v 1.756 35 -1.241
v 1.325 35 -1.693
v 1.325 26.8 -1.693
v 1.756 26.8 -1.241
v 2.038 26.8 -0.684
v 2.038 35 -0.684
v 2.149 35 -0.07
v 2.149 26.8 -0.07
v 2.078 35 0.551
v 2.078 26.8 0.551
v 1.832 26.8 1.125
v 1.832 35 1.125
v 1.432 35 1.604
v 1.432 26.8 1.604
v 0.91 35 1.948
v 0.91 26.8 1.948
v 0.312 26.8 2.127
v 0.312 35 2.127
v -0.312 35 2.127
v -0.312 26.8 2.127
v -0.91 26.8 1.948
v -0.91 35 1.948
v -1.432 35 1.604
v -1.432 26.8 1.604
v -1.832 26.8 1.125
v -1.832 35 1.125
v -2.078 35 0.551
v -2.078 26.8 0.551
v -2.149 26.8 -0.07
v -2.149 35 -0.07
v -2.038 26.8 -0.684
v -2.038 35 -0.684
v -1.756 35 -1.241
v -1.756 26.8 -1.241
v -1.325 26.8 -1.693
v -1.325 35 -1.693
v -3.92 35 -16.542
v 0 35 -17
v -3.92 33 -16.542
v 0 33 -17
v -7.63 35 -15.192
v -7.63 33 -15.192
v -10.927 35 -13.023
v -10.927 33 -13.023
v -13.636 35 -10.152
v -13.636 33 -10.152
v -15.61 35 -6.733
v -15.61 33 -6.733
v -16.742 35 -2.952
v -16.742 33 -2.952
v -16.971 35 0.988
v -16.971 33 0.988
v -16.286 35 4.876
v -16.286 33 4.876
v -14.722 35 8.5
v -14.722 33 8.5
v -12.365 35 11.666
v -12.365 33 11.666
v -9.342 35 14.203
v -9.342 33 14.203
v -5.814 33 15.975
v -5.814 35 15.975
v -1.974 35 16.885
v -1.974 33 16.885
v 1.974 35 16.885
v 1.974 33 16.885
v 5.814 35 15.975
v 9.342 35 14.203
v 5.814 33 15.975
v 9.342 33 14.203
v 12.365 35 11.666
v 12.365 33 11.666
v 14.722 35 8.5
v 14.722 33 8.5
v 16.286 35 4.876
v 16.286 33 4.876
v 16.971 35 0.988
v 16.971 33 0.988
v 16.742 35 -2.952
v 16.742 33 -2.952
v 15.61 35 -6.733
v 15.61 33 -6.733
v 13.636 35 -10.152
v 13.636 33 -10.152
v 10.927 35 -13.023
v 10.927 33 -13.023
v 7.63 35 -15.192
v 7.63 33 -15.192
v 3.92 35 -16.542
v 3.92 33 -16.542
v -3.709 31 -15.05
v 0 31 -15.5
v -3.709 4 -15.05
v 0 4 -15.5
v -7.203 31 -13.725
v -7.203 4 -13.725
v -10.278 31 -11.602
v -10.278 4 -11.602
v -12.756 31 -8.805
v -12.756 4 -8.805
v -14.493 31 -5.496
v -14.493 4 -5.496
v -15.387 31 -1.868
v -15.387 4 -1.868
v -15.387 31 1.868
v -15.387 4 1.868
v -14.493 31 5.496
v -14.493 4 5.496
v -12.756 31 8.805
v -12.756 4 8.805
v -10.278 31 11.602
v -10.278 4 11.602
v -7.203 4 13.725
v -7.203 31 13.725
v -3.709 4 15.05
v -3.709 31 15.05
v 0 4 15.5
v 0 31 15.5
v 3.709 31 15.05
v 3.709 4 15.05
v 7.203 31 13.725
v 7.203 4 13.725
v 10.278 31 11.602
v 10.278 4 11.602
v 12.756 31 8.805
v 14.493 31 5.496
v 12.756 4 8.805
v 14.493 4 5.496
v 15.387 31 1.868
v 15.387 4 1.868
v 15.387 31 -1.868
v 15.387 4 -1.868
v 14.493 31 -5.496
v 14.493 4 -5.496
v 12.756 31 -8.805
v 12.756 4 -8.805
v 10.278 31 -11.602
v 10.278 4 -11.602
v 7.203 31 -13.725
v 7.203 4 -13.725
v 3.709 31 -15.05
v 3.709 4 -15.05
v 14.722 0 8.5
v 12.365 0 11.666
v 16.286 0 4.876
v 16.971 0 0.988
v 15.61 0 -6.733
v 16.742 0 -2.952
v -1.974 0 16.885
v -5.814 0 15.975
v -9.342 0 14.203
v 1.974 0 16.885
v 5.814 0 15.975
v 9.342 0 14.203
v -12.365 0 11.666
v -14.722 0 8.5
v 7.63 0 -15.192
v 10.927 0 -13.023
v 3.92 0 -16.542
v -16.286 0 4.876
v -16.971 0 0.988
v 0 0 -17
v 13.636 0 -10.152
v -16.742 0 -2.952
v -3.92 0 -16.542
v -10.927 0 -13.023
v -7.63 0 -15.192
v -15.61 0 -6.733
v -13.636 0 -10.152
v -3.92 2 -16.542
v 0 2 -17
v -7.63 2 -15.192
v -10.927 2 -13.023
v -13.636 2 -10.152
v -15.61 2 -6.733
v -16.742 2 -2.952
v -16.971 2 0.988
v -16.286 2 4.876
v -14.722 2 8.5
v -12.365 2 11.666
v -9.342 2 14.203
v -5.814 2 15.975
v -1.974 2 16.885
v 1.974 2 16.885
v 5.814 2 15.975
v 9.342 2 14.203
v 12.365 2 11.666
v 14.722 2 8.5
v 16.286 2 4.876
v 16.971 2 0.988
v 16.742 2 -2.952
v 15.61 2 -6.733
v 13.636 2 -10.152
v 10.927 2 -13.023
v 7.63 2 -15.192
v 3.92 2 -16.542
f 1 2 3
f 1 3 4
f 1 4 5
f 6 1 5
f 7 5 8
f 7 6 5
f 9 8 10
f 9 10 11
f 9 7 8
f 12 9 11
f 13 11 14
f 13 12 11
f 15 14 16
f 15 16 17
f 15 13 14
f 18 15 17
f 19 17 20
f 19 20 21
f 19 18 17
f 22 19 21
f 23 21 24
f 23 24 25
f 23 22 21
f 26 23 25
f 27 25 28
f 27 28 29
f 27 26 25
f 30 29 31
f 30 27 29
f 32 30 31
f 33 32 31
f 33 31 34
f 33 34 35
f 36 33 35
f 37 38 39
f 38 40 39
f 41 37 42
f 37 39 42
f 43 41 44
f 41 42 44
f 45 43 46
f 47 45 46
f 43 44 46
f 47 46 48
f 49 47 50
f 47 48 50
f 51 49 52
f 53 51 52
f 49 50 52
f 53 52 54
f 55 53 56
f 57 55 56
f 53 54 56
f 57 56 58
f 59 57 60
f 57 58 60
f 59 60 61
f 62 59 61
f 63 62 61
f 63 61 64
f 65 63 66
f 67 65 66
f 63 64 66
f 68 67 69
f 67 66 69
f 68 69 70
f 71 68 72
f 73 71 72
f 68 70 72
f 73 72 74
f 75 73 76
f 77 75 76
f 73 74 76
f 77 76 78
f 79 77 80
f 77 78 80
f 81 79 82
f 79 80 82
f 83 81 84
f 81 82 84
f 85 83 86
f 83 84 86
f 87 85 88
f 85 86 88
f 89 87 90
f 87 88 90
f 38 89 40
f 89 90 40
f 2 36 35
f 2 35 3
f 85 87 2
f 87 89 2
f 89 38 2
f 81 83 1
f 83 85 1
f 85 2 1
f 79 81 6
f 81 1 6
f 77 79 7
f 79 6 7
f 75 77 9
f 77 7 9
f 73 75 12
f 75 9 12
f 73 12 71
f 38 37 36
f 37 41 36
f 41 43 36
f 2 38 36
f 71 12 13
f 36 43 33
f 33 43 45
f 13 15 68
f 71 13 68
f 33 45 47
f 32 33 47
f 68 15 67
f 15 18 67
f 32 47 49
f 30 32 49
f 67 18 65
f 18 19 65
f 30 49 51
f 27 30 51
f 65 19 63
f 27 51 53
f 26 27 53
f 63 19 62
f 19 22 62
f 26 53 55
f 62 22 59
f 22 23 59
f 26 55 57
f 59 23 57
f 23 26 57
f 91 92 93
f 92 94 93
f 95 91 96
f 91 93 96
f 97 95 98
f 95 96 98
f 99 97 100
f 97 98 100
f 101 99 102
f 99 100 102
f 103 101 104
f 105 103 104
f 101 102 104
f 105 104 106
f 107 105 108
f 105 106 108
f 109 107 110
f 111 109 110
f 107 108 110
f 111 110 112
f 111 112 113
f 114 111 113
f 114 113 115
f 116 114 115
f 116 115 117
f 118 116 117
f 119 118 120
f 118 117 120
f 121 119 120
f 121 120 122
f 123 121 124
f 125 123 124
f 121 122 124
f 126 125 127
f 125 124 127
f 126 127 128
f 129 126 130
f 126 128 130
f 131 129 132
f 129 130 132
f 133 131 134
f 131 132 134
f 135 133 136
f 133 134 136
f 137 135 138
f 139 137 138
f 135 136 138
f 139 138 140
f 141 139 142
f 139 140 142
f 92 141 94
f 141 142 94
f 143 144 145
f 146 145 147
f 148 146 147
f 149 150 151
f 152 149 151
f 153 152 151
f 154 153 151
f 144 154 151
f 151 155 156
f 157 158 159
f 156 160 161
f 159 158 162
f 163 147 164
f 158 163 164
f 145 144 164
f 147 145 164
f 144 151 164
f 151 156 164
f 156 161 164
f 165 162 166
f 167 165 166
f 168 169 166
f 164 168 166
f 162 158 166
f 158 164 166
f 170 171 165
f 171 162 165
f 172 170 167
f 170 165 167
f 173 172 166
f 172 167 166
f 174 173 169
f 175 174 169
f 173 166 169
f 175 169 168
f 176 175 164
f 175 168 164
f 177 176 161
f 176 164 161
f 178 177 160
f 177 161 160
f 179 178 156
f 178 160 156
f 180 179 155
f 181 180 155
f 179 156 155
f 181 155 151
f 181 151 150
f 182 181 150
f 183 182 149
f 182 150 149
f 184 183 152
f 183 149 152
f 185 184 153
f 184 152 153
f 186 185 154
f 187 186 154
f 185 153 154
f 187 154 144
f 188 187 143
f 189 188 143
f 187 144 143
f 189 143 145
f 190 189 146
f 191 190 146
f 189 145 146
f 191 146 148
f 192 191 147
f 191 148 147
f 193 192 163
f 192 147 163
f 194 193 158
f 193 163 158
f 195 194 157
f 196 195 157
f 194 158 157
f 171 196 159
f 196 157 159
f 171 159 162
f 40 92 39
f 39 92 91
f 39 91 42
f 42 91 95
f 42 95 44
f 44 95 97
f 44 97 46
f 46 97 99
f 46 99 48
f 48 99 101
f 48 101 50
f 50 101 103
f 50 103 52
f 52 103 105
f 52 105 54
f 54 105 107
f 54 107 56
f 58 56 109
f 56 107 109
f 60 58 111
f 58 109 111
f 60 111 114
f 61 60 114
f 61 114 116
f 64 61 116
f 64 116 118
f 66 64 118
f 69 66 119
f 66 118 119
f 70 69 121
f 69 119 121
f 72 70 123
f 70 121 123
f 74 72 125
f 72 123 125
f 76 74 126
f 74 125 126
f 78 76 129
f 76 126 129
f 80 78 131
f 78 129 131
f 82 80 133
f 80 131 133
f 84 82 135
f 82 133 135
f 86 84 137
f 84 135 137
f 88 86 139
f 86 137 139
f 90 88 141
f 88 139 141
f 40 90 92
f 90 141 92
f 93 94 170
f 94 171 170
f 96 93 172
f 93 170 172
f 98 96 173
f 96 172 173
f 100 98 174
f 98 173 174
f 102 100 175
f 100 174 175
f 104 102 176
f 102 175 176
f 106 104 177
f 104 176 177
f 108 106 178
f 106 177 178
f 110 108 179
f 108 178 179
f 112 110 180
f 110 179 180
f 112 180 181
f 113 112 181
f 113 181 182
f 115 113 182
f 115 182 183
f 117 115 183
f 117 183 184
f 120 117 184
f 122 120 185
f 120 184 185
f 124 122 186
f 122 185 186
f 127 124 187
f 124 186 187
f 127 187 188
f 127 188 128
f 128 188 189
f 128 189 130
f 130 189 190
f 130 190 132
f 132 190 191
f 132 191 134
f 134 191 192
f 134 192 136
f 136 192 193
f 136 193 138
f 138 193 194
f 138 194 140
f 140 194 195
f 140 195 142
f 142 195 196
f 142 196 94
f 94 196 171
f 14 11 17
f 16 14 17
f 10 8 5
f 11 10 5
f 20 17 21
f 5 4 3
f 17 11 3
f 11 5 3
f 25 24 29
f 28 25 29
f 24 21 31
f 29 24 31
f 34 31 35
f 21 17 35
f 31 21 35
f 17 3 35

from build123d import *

# Parameters (mm, degrees)
CUT_EXTRUDE1_DEPTH = 8.2


with BuildPart() as part:
    # Sketch1 → Revolve1 (revolve)
    with BuildSketch(Plane.XY, mode=Mode.PRIVATE) as revolve1_sk:
        Polygon((0, 0), (0, 35), (-17, 35), (-17, 33), (-15.5, 31), (-15.5, 4), (-17, 2), (-17, 0), align=None)
    revolve(revolve1_sk.sketch.rotate(Axis((0, 0, 0), (0, 1, 0)), 270), axis=Axis((0, 0, 0), (0, 1, 0)))

    # Sketch2 → Cut-Extrude1 (cut)
    with BuildSketch(Plane(origin=(0, 35, 0), x_dir=(1, 0, 0), z_dir=(0, 1, 0))):
        with BuildLine():
            Line((-1.325, 1.693184869), (1.325, 1.693184869))
            ThreePointArc((1.325, 1.693184869), (0, -2.15), (-1.325, 1.693184869))
        make_face()
    extrude(amount=-CUT_EXTRUDE1_DEPTH, mode=Mode.SUBTRACT)


solid = part.part
